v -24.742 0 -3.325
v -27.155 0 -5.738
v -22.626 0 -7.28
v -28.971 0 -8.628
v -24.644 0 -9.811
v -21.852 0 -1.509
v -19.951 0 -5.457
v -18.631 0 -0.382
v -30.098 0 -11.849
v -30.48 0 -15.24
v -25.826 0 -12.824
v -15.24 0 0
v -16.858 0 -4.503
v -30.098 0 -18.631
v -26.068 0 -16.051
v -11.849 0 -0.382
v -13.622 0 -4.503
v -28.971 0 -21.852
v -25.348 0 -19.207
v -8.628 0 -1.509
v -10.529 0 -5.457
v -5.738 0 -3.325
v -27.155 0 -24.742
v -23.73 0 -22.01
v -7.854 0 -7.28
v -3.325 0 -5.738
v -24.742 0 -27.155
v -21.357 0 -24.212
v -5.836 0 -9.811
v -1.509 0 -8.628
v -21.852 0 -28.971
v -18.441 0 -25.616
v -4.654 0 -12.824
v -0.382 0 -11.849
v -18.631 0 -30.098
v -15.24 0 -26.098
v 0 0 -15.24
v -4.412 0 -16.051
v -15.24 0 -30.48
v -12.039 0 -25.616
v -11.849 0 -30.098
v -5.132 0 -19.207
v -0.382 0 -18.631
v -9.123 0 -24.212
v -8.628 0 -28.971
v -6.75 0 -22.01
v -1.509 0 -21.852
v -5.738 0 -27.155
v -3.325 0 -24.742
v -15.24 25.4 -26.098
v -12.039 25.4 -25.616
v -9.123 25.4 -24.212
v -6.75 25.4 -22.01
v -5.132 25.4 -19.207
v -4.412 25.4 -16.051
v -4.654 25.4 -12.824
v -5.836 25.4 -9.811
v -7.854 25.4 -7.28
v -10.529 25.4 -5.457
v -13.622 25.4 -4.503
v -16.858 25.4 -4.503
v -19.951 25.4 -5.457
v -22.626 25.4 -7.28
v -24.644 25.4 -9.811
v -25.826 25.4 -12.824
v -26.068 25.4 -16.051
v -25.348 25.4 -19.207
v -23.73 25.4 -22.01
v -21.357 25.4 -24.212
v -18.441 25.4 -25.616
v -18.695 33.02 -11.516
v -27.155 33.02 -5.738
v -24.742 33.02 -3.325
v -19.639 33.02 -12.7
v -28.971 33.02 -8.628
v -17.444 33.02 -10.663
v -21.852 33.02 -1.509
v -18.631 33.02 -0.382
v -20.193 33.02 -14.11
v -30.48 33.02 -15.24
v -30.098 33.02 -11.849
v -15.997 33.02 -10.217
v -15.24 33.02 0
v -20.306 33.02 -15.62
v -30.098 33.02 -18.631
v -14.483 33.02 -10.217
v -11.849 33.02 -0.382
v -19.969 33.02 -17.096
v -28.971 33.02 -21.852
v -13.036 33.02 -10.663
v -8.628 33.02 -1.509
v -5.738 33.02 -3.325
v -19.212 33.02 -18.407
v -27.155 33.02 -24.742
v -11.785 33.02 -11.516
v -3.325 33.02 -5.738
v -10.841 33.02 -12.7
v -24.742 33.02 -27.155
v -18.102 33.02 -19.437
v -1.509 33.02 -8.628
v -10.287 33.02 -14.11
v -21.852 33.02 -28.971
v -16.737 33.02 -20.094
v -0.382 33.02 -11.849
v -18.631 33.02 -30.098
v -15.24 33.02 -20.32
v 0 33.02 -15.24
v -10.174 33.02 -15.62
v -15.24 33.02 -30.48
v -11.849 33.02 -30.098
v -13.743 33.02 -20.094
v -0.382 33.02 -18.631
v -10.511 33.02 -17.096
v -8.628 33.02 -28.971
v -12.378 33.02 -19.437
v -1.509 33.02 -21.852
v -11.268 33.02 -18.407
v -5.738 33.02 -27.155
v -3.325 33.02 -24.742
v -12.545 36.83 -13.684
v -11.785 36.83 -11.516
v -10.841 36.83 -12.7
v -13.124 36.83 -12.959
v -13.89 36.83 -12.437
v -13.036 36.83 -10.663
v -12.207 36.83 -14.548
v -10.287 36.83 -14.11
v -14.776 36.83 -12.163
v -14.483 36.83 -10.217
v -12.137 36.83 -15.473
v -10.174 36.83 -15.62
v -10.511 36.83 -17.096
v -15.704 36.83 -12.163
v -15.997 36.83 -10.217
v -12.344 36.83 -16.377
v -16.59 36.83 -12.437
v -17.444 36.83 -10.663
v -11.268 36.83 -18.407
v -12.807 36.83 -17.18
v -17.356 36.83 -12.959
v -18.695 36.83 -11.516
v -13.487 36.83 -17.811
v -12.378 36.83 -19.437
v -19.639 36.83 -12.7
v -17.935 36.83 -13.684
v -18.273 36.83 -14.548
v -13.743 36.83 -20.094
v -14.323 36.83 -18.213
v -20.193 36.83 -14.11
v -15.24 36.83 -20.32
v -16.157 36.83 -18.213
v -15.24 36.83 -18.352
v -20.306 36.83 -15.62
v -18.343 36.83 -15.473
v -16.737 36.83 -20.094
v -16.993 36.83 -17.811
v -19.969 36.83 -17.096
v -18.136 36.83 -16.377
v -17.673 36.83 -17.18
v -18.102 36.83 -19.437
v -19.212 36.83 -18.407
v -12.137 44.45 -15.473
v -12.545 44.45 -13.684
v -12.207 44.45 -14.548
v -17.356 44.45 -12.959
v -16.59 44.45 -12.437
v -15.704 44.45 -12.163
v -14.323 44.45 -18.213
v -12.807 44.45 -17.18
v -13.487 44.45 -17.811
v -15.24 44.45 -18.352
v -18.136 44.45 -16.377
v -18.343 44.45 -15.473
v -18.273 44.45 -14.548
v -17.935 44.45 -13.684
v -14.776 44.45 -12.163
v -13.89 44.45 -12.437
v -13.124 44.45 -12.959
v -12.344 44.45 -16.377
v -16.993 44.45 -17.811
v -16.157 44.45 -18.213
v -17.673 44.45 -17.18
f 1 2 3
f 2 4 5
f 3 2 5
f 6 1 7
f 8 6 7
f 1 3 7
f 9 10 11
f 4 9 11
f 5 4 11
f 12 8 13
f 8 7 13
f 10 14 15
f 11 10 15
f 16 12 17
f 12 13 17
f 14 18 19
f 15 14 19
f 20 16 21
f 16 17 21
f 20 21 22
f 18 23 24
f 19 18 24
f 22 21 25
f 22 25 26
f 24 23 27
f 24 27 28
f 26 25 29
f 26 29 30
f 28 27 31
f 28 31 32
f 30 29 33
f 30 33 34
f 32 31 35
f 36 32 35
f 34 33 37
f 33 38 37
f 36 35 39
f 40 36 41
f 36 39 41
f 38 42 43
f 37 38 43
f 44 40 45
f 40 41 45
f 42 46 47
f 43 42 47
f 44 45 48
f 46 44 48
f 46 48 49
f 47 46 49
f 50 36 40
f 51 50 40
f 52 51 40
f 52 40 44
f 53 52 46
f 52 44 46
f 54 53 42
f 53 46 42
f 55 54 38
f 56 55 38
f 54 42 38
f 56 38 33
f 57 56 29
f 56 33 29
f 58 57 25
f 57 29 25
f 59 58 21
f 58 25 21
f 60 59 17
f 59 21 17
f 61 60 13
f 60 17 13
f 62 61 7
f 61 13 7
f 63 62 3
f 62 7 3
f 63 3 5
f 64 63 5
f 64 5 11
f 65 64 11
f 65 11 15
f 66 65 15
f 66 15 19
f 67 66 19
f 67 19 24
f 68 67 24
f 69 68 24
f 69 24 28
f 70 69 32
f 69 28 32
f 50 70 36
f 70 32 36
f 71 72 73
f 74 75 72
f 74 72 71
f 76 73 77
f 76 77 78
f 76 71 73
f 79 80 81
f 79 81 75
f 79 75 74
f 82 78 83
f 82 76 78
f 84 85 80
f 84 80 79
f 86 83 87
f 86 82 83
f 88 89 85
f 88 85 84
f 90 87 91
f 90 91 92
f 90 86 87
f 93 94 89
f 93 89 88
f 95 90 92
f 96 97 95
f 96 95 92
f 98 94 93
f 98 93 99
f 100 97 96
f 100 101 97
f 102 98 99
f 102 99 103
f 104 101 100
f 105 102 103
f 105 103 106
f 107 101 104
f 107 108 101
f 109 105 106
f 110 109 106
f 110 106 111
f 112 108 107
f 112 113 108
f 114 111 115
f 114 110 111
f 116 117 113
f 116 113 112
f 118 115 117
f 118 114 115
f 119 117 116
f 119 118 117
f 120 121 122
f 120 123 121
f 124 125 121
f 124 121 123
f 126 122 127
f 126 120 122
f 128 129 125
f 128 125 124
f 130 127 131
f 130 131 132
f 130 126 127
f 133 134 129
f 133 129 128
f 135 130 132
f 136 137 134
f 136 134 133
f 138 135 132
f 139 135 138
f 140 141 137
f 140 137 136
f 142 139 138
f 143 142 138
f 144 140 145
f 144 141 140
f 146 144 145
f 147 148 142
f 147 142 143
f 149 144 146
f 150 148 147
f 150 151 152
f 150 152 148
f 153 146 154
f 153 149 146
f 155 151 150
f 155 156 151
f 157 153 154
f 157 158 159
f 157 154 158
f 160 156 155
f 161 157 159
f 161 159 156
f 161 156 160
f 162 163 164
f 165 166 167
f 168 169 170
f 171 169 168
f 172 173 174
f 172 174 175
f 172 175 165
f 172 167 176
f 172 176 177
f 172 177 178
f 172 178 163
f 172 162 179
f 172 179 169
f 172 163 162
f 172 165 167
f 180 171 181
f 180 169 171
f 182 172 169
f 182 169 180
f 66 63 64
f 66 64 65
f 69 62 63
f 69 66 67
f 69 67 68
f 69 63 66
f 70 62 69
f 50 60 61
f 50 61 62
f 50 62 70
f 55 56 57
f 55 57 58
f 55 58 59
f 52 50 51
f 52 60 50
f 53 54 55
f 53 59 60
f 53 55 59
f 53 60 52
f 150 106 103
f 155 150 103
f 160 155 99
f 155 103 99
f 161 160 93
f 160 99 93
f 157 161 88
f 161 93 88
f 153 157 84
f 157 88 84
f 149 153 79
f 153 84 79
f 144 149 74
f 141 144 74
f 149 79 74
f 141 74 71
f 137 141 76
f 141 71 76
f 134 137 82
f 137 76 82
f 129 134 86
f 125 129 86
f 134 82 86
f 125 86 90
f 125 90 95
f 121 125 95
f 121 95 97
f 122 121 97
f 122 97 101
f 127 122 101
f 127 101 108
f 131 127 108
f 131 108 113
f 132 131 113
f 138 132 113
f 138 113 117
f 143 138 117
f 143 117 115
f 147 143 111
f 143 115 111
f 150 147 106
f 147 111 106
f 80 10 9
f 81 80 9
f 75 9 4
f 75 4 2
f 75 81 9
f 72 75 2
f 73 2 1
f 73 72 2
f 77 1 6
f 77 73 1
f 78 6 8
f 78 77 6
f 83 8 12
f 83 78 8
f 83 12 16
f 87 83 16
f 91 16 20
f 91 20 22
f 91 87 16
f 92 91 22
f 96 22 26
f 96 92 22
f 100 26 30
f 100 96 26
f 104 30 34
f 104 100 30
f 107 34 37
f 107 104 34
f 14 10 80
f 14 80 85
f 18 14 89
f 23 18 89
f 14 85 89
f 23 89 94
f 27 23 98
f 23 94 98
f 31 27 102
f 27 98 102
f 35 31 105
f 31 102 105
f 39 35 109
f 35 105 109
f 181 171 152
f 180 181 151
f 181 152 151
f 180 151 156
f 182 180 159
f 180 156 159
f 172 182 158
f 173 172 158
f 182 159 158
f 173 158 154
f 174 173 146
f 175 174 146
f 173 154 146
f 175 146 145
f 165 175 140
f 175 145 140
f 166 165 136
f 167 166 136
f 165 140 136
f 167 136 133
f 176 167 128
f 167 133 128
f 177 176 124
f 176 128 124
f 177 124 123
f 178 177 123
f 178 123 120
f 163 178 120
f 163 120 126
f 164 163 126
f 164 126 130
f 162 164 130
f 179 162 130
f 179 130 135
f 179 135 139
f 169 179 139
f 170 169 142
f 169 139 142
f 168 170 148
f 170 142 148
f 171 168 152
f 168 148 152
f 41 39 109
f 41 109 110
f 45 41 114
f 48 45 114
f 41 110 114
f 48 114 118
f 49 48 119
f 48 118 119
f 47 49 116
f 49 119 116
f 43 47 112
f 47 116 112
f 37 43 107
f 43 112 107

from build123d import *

# Parameters (mm, degrees)
SKETCH3_W           = 30.48
SKETCH3_H           = 30.48
BOSS_EXTRUDE1_DEPTH = 33.02
SKETCH4_R           = 5.08
BOSS_EXTRUDE2_DEPTH = 3.81
SKETCH5_R           = 3.1115
BOSS_EXTRUDE3_DEPTH = 7.62
SKETCH6_R           = 10.8585
CUT_EXTRUDE1_DEPTH  = 25.4
FILLET1_R           = 15.24


with BuildPart() as part:
    # Sketch3 → Boss-Extrude1 (new body)
    with BuildSketch(Plane(origin=(0, 0, 0), x_dir=(1, 0, 0), z_dir=(0, 1, 0))):
        with Locations((-15.24, 15.24)):
            Rectangle(SKETCH3_W, SKETCH3_H)
    extrude(amount=BOSS_EXTRUDE1_DEPTH)

    # Sketch4 → Boss-Extrude2 (add)
    with BuildSketch(Plane(origin=(0, 33.02, 0), x_dir=(1, 0, 0), z_dir=(0, 1, 0))):
        with Locations(Location((-15.24, 15.24, 0), (0, 0, 90))):
            Circle(SKETCH4_R)
    extrude(amount=BOSS_EXTRUDE2_DEPTH)

    # Sketch5 → Boss-Extrude3 (add)
    with BuildSketch(Plane(origin=(0, 36.83, 0), x_dir=(1, 0, 0), z_dir=(0, 1, 0))):
        with Locations(Location((-15.24, 15.24, 0), (0, 0, 90))):
            Circle(SKETCH5_R)
    extrude(amount=BOSS_EXTRUDE3_DEPTH)

    # Sketch6 → Cut-Extrude1 (cut)
    with BuildSketch(Plane.XZ):
        with Locations(Location((-15.24, -15.24, 0), (0, 0, 270))):
            Circle(SKETCH6_R)
    extrude(amount=-CUT_EXTRUDE1_DEPTH, mode=Mode.SUBTRACT)

    # Fillet1
    fillet1_edges = [part.edges().sort_by_distance(p)[0] for p in [
        (-30.48, 16.51, -30.48),
        (0, 16.51, -30.48),
        (-30.48, 16.51, 0),
        (0, 16.51, 0),
    ]]
    fillet(fillet1_edges, radius=FILLET1_R - 0.0001)  # a hair under: the kernel refuses the full size


solid = part.part
